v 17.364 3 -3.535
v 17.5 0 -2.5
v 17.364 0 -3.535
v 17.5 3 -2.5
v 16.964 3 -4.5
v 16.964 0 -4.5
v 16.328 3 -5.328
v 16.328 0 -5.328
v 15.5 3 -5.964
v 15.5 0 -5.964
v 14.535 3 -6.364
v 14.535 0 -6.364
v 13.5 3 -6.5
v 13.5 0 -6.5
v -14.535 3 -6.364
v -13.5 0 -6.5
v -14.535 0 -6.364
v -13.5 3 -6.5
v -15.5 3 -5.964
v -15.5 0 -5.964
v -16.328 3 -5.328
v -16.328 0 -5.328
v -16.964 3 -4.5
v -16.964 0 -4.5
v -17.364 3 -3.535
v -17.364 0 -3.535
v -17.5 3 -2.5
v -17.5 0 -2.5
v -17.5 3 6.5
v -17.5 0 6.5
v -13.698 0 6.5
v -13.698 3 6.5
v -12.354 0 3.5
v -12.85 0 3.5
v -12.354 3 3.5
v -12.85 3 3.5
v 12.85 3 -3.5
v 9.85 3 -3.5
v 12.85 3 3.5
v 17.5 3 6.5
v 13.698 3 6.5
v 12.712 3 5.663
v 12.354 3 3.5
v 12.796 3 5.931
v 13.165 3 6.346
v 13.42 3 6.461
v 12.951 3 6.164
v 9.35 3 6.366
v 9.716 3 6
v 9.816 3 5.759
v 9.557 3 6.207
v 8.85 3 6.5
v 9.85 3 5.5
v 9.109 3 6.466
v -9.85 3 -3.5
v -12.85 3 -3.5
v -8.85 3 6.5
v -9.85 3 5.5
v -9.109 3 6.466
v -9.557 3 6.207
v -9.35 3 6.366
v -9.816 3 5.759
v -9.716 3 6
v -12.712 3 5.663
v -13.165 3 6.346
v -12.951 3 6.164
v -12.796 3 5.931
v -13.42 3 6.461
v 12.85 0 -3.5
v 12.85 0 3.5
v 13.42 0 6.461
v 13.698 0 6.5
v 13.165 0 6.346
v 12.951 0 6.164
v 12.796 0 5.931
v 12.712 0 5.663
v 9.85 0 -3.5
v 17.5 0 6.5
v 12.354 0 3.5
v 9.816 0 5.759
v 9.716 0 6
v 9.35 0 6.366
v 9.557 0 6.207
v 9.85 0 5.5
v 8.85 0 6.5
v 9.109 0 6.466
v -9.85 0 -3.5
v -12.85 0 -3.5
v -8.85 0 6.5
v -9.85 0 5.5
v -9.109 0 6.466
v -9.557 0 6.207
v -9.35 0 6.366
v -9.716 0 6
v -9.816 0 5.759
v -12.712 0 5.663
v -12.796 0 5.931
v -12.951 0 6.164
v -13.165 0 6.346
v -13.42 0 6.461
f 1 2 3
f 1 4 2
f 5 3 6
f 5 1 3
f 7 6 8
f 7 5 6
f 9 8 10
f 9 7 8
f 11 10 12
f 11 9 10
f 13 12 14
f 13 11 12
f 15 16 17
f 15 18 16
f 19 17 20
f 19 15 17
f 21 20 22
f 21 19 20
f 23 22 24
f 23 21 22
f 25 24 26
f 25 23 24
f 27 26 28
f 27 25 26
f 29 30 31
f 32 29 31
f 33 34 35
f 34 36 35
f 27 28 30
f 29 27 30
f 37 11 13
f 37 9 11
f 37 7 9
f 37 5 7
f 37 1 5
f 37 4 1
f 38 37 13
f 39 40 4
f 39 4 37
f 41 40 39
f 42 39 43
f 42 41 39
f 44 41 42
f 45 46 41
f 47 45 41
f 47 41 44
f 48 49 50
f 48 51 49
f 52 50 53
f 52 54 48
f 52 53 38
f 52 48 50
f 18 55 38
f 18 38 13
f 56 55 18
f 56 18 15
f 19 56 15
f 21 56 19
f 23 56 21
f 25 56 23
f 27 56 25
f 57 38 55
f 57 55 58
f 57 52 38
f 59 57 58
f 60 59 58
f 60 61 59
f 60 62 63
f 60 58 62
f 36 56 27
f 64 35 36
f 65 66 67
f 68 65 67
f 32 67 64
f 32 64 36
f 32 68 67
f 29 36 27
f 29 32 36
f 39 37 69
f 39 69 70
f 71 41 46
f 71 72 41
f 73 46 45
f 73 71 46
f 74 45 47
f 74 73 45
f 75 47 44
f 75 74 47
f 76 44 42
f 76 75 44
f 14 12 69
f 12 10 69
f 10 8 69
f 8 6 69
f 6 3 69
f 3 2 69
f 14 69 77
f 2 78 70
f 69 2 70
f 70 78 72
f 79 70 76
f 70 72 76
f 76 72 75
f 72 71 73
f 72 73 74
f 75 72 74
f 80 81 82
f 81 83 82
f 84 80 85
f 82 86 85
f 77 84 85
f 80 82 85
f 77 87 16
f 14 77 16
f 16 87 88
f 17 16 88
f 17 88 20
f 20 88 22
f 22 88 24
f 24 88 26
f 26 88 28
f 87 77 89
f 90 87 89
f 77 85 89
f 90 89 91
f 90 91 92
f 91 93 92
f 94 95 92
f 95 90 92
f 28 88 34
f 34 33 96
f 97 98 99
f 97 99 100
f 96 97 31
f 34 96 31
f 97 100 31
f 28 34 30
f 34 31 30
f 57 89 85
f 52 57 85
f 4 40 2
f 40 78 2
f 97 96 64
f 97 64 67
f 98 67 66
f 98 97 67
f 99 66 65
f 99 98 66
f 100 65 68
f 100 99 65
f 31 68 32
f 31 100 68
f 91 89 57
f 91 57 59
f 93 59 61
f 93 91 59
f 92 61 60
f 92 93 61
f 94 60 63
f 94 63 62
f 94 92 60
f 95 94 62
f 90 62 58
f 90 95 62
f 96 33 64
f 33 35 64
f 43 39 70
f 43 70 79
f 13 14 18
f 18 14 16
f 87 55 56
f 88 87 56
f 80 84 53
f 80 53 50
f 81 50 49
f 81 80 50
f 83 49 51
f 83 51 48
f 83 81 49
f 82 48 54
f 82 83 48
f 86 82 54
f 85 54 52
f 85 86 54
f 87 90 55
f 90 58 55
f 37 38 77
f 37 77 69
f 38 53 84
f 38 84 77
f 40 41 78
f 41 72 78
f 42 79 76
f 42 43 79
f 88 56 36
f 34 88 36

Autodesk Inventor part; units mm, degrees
ref_plane "YZ Plane" through (0, 0, 0) normal (1, 0, 0) x (0, 1, 0)
ref_plane "XZ Plane" through (0, 0, 0) normal (0, 1, 0) x (-1, 0, 0)
ref_plane "XY Plane" through (0, 0, 0) normal (0, 0, 1) x (1, 0, 0)
sketch "Sketch1" plane through (0, 0, 0) normal (0, 1, 0) x (-1, 0, 0)
  line L0 (17.5, 6.5) -> (-17.5, 6.5)
  line L1 (-17.5, 6.5) -> (-17.5, -6.5)
  line L2 (-17.5, -6.5) -> (17.5, -6.5)
  line L3 (17.5, -6.5) -> (17.5, 6.5)
  line L4 (17.5, 6.5) -> (-17.5, -6.5) construction
  line L5 (-17.5, 6.5) -> (17.5, -6.5) construction
  point P0 (0, 0)
  dimension "d0" = 35
  dimension "d1" = 13
extrude "Extrusion1" add sketch "Sketch1" along normal blind 3
fillet "Fillet1" radius 4 2 edges at (-17.5, 1.5, -6.5) (17.5, 1.5, -6.5)
sketch "Sketch2" plane through (0, 3, 0) normal (0, 1, 0) x (1, 0, 0)
  line L0 (13.5, 6.5) -> (-13.5, 6.5) projected
  arc A0 (-13.5, 6.5) -> (-17.5, 2.5) centre (-13.5, 2.5) ccw projected
  line L1 (-17.5, -6.5) -> (17.5, -6.5) projected
  line L2 (17.5, -6.5) -> (17.5, 2.5) projected
  line L3 (-9.85, 3.5) -> (-12.85, 3.5)
  line L4 (-12.85, 3.5) -> (-12.85, -6.5)
  line L5 (-12.85, -6.5) -> (-9.85, -6.5)
  line L6 (-9.85, -6.5) -> (-9.85, 3.5)
  line L7 (-9.85, 3.5) -> (-12.85, -6.5) construction
  line L8 (-12.85, 3.5) -> (-9.85, -6.5) construction
  line L9 (0, 6.5) -> (0, -6.5) construction
  line L10 (0, 0) -> (17.5, 0) construction
  line L11 (-11.35, 6.5) -> (-11.35, -3.5) construction
  line L12 (-12.85, -3.5) -> (-12.3536, -3.5)
  line L13 (-12.3536, -3.5) -> (-12.85, -6.5)
  line L14 (9.85, 3.5) -> (12.85, 3.5)
  line L15 (12.85, 3.5) -> (12.85, -6.5)
  line L16 (12.85, -6.5) -> (9.85, -6.5)
  line L17 (9.85, -6.5) -> (9.85, 3.5)
  line L18 (9.85, 3.5) -> (12.85, -6.5) construction
  line L19 (12.85, 3.5) -> (9.85, -6.5) construction
  line L20 (12.85, -3.5) -> (12.3536, -3.5)
  line L21 (12.3536, -3.5) -> (12.85, -6.5)
  point P0 (-11.35, -1.5)
  point P1 (13.5, 2.5)
  point P2 (11.35, -1.5)
  point P3 (11.35, -3.5)
  dimension "d6" = 9.85
  dimension "d7" = 3
  dimension "d9" = 3
  dimension "d10" = 10
  dimension "d15" = 9.396
  dimension "d16" = 10
extrude "Extrusion2" cut sketch "Sketch2" against normal up to next contours L13 L12 L4 L3 L6 L1 | L17 L14 L15 L20 L21 L1
fillet "Fillet2" radius 1 4 edges at (-12.85, 1.5, 6.5) (-9.85, 1.5, 6.5) (9.85, 1.5, 6.5) (12.85, 1.5, 6.5)
equation "\"BendRadius\" = Thickness"
equation "\"BendReliefWidth\" = Thickness"
equation "\"BendReliefDepth\" = 0.5 * Thickness"
equation "\"CornerReliefSize\" = 4 * Thickness"
equation "\"MinimumRemnant\" = 2 * Thickness"
equation "\"TransitionRadius\" = BendRadius"
equation "\"JacobiRadiusSize\" = Thickness"
equation "\"GapSize\" = Thickness"
equation "\"Thickness\" = 0.5"
properties part number "link" material "Glass"
